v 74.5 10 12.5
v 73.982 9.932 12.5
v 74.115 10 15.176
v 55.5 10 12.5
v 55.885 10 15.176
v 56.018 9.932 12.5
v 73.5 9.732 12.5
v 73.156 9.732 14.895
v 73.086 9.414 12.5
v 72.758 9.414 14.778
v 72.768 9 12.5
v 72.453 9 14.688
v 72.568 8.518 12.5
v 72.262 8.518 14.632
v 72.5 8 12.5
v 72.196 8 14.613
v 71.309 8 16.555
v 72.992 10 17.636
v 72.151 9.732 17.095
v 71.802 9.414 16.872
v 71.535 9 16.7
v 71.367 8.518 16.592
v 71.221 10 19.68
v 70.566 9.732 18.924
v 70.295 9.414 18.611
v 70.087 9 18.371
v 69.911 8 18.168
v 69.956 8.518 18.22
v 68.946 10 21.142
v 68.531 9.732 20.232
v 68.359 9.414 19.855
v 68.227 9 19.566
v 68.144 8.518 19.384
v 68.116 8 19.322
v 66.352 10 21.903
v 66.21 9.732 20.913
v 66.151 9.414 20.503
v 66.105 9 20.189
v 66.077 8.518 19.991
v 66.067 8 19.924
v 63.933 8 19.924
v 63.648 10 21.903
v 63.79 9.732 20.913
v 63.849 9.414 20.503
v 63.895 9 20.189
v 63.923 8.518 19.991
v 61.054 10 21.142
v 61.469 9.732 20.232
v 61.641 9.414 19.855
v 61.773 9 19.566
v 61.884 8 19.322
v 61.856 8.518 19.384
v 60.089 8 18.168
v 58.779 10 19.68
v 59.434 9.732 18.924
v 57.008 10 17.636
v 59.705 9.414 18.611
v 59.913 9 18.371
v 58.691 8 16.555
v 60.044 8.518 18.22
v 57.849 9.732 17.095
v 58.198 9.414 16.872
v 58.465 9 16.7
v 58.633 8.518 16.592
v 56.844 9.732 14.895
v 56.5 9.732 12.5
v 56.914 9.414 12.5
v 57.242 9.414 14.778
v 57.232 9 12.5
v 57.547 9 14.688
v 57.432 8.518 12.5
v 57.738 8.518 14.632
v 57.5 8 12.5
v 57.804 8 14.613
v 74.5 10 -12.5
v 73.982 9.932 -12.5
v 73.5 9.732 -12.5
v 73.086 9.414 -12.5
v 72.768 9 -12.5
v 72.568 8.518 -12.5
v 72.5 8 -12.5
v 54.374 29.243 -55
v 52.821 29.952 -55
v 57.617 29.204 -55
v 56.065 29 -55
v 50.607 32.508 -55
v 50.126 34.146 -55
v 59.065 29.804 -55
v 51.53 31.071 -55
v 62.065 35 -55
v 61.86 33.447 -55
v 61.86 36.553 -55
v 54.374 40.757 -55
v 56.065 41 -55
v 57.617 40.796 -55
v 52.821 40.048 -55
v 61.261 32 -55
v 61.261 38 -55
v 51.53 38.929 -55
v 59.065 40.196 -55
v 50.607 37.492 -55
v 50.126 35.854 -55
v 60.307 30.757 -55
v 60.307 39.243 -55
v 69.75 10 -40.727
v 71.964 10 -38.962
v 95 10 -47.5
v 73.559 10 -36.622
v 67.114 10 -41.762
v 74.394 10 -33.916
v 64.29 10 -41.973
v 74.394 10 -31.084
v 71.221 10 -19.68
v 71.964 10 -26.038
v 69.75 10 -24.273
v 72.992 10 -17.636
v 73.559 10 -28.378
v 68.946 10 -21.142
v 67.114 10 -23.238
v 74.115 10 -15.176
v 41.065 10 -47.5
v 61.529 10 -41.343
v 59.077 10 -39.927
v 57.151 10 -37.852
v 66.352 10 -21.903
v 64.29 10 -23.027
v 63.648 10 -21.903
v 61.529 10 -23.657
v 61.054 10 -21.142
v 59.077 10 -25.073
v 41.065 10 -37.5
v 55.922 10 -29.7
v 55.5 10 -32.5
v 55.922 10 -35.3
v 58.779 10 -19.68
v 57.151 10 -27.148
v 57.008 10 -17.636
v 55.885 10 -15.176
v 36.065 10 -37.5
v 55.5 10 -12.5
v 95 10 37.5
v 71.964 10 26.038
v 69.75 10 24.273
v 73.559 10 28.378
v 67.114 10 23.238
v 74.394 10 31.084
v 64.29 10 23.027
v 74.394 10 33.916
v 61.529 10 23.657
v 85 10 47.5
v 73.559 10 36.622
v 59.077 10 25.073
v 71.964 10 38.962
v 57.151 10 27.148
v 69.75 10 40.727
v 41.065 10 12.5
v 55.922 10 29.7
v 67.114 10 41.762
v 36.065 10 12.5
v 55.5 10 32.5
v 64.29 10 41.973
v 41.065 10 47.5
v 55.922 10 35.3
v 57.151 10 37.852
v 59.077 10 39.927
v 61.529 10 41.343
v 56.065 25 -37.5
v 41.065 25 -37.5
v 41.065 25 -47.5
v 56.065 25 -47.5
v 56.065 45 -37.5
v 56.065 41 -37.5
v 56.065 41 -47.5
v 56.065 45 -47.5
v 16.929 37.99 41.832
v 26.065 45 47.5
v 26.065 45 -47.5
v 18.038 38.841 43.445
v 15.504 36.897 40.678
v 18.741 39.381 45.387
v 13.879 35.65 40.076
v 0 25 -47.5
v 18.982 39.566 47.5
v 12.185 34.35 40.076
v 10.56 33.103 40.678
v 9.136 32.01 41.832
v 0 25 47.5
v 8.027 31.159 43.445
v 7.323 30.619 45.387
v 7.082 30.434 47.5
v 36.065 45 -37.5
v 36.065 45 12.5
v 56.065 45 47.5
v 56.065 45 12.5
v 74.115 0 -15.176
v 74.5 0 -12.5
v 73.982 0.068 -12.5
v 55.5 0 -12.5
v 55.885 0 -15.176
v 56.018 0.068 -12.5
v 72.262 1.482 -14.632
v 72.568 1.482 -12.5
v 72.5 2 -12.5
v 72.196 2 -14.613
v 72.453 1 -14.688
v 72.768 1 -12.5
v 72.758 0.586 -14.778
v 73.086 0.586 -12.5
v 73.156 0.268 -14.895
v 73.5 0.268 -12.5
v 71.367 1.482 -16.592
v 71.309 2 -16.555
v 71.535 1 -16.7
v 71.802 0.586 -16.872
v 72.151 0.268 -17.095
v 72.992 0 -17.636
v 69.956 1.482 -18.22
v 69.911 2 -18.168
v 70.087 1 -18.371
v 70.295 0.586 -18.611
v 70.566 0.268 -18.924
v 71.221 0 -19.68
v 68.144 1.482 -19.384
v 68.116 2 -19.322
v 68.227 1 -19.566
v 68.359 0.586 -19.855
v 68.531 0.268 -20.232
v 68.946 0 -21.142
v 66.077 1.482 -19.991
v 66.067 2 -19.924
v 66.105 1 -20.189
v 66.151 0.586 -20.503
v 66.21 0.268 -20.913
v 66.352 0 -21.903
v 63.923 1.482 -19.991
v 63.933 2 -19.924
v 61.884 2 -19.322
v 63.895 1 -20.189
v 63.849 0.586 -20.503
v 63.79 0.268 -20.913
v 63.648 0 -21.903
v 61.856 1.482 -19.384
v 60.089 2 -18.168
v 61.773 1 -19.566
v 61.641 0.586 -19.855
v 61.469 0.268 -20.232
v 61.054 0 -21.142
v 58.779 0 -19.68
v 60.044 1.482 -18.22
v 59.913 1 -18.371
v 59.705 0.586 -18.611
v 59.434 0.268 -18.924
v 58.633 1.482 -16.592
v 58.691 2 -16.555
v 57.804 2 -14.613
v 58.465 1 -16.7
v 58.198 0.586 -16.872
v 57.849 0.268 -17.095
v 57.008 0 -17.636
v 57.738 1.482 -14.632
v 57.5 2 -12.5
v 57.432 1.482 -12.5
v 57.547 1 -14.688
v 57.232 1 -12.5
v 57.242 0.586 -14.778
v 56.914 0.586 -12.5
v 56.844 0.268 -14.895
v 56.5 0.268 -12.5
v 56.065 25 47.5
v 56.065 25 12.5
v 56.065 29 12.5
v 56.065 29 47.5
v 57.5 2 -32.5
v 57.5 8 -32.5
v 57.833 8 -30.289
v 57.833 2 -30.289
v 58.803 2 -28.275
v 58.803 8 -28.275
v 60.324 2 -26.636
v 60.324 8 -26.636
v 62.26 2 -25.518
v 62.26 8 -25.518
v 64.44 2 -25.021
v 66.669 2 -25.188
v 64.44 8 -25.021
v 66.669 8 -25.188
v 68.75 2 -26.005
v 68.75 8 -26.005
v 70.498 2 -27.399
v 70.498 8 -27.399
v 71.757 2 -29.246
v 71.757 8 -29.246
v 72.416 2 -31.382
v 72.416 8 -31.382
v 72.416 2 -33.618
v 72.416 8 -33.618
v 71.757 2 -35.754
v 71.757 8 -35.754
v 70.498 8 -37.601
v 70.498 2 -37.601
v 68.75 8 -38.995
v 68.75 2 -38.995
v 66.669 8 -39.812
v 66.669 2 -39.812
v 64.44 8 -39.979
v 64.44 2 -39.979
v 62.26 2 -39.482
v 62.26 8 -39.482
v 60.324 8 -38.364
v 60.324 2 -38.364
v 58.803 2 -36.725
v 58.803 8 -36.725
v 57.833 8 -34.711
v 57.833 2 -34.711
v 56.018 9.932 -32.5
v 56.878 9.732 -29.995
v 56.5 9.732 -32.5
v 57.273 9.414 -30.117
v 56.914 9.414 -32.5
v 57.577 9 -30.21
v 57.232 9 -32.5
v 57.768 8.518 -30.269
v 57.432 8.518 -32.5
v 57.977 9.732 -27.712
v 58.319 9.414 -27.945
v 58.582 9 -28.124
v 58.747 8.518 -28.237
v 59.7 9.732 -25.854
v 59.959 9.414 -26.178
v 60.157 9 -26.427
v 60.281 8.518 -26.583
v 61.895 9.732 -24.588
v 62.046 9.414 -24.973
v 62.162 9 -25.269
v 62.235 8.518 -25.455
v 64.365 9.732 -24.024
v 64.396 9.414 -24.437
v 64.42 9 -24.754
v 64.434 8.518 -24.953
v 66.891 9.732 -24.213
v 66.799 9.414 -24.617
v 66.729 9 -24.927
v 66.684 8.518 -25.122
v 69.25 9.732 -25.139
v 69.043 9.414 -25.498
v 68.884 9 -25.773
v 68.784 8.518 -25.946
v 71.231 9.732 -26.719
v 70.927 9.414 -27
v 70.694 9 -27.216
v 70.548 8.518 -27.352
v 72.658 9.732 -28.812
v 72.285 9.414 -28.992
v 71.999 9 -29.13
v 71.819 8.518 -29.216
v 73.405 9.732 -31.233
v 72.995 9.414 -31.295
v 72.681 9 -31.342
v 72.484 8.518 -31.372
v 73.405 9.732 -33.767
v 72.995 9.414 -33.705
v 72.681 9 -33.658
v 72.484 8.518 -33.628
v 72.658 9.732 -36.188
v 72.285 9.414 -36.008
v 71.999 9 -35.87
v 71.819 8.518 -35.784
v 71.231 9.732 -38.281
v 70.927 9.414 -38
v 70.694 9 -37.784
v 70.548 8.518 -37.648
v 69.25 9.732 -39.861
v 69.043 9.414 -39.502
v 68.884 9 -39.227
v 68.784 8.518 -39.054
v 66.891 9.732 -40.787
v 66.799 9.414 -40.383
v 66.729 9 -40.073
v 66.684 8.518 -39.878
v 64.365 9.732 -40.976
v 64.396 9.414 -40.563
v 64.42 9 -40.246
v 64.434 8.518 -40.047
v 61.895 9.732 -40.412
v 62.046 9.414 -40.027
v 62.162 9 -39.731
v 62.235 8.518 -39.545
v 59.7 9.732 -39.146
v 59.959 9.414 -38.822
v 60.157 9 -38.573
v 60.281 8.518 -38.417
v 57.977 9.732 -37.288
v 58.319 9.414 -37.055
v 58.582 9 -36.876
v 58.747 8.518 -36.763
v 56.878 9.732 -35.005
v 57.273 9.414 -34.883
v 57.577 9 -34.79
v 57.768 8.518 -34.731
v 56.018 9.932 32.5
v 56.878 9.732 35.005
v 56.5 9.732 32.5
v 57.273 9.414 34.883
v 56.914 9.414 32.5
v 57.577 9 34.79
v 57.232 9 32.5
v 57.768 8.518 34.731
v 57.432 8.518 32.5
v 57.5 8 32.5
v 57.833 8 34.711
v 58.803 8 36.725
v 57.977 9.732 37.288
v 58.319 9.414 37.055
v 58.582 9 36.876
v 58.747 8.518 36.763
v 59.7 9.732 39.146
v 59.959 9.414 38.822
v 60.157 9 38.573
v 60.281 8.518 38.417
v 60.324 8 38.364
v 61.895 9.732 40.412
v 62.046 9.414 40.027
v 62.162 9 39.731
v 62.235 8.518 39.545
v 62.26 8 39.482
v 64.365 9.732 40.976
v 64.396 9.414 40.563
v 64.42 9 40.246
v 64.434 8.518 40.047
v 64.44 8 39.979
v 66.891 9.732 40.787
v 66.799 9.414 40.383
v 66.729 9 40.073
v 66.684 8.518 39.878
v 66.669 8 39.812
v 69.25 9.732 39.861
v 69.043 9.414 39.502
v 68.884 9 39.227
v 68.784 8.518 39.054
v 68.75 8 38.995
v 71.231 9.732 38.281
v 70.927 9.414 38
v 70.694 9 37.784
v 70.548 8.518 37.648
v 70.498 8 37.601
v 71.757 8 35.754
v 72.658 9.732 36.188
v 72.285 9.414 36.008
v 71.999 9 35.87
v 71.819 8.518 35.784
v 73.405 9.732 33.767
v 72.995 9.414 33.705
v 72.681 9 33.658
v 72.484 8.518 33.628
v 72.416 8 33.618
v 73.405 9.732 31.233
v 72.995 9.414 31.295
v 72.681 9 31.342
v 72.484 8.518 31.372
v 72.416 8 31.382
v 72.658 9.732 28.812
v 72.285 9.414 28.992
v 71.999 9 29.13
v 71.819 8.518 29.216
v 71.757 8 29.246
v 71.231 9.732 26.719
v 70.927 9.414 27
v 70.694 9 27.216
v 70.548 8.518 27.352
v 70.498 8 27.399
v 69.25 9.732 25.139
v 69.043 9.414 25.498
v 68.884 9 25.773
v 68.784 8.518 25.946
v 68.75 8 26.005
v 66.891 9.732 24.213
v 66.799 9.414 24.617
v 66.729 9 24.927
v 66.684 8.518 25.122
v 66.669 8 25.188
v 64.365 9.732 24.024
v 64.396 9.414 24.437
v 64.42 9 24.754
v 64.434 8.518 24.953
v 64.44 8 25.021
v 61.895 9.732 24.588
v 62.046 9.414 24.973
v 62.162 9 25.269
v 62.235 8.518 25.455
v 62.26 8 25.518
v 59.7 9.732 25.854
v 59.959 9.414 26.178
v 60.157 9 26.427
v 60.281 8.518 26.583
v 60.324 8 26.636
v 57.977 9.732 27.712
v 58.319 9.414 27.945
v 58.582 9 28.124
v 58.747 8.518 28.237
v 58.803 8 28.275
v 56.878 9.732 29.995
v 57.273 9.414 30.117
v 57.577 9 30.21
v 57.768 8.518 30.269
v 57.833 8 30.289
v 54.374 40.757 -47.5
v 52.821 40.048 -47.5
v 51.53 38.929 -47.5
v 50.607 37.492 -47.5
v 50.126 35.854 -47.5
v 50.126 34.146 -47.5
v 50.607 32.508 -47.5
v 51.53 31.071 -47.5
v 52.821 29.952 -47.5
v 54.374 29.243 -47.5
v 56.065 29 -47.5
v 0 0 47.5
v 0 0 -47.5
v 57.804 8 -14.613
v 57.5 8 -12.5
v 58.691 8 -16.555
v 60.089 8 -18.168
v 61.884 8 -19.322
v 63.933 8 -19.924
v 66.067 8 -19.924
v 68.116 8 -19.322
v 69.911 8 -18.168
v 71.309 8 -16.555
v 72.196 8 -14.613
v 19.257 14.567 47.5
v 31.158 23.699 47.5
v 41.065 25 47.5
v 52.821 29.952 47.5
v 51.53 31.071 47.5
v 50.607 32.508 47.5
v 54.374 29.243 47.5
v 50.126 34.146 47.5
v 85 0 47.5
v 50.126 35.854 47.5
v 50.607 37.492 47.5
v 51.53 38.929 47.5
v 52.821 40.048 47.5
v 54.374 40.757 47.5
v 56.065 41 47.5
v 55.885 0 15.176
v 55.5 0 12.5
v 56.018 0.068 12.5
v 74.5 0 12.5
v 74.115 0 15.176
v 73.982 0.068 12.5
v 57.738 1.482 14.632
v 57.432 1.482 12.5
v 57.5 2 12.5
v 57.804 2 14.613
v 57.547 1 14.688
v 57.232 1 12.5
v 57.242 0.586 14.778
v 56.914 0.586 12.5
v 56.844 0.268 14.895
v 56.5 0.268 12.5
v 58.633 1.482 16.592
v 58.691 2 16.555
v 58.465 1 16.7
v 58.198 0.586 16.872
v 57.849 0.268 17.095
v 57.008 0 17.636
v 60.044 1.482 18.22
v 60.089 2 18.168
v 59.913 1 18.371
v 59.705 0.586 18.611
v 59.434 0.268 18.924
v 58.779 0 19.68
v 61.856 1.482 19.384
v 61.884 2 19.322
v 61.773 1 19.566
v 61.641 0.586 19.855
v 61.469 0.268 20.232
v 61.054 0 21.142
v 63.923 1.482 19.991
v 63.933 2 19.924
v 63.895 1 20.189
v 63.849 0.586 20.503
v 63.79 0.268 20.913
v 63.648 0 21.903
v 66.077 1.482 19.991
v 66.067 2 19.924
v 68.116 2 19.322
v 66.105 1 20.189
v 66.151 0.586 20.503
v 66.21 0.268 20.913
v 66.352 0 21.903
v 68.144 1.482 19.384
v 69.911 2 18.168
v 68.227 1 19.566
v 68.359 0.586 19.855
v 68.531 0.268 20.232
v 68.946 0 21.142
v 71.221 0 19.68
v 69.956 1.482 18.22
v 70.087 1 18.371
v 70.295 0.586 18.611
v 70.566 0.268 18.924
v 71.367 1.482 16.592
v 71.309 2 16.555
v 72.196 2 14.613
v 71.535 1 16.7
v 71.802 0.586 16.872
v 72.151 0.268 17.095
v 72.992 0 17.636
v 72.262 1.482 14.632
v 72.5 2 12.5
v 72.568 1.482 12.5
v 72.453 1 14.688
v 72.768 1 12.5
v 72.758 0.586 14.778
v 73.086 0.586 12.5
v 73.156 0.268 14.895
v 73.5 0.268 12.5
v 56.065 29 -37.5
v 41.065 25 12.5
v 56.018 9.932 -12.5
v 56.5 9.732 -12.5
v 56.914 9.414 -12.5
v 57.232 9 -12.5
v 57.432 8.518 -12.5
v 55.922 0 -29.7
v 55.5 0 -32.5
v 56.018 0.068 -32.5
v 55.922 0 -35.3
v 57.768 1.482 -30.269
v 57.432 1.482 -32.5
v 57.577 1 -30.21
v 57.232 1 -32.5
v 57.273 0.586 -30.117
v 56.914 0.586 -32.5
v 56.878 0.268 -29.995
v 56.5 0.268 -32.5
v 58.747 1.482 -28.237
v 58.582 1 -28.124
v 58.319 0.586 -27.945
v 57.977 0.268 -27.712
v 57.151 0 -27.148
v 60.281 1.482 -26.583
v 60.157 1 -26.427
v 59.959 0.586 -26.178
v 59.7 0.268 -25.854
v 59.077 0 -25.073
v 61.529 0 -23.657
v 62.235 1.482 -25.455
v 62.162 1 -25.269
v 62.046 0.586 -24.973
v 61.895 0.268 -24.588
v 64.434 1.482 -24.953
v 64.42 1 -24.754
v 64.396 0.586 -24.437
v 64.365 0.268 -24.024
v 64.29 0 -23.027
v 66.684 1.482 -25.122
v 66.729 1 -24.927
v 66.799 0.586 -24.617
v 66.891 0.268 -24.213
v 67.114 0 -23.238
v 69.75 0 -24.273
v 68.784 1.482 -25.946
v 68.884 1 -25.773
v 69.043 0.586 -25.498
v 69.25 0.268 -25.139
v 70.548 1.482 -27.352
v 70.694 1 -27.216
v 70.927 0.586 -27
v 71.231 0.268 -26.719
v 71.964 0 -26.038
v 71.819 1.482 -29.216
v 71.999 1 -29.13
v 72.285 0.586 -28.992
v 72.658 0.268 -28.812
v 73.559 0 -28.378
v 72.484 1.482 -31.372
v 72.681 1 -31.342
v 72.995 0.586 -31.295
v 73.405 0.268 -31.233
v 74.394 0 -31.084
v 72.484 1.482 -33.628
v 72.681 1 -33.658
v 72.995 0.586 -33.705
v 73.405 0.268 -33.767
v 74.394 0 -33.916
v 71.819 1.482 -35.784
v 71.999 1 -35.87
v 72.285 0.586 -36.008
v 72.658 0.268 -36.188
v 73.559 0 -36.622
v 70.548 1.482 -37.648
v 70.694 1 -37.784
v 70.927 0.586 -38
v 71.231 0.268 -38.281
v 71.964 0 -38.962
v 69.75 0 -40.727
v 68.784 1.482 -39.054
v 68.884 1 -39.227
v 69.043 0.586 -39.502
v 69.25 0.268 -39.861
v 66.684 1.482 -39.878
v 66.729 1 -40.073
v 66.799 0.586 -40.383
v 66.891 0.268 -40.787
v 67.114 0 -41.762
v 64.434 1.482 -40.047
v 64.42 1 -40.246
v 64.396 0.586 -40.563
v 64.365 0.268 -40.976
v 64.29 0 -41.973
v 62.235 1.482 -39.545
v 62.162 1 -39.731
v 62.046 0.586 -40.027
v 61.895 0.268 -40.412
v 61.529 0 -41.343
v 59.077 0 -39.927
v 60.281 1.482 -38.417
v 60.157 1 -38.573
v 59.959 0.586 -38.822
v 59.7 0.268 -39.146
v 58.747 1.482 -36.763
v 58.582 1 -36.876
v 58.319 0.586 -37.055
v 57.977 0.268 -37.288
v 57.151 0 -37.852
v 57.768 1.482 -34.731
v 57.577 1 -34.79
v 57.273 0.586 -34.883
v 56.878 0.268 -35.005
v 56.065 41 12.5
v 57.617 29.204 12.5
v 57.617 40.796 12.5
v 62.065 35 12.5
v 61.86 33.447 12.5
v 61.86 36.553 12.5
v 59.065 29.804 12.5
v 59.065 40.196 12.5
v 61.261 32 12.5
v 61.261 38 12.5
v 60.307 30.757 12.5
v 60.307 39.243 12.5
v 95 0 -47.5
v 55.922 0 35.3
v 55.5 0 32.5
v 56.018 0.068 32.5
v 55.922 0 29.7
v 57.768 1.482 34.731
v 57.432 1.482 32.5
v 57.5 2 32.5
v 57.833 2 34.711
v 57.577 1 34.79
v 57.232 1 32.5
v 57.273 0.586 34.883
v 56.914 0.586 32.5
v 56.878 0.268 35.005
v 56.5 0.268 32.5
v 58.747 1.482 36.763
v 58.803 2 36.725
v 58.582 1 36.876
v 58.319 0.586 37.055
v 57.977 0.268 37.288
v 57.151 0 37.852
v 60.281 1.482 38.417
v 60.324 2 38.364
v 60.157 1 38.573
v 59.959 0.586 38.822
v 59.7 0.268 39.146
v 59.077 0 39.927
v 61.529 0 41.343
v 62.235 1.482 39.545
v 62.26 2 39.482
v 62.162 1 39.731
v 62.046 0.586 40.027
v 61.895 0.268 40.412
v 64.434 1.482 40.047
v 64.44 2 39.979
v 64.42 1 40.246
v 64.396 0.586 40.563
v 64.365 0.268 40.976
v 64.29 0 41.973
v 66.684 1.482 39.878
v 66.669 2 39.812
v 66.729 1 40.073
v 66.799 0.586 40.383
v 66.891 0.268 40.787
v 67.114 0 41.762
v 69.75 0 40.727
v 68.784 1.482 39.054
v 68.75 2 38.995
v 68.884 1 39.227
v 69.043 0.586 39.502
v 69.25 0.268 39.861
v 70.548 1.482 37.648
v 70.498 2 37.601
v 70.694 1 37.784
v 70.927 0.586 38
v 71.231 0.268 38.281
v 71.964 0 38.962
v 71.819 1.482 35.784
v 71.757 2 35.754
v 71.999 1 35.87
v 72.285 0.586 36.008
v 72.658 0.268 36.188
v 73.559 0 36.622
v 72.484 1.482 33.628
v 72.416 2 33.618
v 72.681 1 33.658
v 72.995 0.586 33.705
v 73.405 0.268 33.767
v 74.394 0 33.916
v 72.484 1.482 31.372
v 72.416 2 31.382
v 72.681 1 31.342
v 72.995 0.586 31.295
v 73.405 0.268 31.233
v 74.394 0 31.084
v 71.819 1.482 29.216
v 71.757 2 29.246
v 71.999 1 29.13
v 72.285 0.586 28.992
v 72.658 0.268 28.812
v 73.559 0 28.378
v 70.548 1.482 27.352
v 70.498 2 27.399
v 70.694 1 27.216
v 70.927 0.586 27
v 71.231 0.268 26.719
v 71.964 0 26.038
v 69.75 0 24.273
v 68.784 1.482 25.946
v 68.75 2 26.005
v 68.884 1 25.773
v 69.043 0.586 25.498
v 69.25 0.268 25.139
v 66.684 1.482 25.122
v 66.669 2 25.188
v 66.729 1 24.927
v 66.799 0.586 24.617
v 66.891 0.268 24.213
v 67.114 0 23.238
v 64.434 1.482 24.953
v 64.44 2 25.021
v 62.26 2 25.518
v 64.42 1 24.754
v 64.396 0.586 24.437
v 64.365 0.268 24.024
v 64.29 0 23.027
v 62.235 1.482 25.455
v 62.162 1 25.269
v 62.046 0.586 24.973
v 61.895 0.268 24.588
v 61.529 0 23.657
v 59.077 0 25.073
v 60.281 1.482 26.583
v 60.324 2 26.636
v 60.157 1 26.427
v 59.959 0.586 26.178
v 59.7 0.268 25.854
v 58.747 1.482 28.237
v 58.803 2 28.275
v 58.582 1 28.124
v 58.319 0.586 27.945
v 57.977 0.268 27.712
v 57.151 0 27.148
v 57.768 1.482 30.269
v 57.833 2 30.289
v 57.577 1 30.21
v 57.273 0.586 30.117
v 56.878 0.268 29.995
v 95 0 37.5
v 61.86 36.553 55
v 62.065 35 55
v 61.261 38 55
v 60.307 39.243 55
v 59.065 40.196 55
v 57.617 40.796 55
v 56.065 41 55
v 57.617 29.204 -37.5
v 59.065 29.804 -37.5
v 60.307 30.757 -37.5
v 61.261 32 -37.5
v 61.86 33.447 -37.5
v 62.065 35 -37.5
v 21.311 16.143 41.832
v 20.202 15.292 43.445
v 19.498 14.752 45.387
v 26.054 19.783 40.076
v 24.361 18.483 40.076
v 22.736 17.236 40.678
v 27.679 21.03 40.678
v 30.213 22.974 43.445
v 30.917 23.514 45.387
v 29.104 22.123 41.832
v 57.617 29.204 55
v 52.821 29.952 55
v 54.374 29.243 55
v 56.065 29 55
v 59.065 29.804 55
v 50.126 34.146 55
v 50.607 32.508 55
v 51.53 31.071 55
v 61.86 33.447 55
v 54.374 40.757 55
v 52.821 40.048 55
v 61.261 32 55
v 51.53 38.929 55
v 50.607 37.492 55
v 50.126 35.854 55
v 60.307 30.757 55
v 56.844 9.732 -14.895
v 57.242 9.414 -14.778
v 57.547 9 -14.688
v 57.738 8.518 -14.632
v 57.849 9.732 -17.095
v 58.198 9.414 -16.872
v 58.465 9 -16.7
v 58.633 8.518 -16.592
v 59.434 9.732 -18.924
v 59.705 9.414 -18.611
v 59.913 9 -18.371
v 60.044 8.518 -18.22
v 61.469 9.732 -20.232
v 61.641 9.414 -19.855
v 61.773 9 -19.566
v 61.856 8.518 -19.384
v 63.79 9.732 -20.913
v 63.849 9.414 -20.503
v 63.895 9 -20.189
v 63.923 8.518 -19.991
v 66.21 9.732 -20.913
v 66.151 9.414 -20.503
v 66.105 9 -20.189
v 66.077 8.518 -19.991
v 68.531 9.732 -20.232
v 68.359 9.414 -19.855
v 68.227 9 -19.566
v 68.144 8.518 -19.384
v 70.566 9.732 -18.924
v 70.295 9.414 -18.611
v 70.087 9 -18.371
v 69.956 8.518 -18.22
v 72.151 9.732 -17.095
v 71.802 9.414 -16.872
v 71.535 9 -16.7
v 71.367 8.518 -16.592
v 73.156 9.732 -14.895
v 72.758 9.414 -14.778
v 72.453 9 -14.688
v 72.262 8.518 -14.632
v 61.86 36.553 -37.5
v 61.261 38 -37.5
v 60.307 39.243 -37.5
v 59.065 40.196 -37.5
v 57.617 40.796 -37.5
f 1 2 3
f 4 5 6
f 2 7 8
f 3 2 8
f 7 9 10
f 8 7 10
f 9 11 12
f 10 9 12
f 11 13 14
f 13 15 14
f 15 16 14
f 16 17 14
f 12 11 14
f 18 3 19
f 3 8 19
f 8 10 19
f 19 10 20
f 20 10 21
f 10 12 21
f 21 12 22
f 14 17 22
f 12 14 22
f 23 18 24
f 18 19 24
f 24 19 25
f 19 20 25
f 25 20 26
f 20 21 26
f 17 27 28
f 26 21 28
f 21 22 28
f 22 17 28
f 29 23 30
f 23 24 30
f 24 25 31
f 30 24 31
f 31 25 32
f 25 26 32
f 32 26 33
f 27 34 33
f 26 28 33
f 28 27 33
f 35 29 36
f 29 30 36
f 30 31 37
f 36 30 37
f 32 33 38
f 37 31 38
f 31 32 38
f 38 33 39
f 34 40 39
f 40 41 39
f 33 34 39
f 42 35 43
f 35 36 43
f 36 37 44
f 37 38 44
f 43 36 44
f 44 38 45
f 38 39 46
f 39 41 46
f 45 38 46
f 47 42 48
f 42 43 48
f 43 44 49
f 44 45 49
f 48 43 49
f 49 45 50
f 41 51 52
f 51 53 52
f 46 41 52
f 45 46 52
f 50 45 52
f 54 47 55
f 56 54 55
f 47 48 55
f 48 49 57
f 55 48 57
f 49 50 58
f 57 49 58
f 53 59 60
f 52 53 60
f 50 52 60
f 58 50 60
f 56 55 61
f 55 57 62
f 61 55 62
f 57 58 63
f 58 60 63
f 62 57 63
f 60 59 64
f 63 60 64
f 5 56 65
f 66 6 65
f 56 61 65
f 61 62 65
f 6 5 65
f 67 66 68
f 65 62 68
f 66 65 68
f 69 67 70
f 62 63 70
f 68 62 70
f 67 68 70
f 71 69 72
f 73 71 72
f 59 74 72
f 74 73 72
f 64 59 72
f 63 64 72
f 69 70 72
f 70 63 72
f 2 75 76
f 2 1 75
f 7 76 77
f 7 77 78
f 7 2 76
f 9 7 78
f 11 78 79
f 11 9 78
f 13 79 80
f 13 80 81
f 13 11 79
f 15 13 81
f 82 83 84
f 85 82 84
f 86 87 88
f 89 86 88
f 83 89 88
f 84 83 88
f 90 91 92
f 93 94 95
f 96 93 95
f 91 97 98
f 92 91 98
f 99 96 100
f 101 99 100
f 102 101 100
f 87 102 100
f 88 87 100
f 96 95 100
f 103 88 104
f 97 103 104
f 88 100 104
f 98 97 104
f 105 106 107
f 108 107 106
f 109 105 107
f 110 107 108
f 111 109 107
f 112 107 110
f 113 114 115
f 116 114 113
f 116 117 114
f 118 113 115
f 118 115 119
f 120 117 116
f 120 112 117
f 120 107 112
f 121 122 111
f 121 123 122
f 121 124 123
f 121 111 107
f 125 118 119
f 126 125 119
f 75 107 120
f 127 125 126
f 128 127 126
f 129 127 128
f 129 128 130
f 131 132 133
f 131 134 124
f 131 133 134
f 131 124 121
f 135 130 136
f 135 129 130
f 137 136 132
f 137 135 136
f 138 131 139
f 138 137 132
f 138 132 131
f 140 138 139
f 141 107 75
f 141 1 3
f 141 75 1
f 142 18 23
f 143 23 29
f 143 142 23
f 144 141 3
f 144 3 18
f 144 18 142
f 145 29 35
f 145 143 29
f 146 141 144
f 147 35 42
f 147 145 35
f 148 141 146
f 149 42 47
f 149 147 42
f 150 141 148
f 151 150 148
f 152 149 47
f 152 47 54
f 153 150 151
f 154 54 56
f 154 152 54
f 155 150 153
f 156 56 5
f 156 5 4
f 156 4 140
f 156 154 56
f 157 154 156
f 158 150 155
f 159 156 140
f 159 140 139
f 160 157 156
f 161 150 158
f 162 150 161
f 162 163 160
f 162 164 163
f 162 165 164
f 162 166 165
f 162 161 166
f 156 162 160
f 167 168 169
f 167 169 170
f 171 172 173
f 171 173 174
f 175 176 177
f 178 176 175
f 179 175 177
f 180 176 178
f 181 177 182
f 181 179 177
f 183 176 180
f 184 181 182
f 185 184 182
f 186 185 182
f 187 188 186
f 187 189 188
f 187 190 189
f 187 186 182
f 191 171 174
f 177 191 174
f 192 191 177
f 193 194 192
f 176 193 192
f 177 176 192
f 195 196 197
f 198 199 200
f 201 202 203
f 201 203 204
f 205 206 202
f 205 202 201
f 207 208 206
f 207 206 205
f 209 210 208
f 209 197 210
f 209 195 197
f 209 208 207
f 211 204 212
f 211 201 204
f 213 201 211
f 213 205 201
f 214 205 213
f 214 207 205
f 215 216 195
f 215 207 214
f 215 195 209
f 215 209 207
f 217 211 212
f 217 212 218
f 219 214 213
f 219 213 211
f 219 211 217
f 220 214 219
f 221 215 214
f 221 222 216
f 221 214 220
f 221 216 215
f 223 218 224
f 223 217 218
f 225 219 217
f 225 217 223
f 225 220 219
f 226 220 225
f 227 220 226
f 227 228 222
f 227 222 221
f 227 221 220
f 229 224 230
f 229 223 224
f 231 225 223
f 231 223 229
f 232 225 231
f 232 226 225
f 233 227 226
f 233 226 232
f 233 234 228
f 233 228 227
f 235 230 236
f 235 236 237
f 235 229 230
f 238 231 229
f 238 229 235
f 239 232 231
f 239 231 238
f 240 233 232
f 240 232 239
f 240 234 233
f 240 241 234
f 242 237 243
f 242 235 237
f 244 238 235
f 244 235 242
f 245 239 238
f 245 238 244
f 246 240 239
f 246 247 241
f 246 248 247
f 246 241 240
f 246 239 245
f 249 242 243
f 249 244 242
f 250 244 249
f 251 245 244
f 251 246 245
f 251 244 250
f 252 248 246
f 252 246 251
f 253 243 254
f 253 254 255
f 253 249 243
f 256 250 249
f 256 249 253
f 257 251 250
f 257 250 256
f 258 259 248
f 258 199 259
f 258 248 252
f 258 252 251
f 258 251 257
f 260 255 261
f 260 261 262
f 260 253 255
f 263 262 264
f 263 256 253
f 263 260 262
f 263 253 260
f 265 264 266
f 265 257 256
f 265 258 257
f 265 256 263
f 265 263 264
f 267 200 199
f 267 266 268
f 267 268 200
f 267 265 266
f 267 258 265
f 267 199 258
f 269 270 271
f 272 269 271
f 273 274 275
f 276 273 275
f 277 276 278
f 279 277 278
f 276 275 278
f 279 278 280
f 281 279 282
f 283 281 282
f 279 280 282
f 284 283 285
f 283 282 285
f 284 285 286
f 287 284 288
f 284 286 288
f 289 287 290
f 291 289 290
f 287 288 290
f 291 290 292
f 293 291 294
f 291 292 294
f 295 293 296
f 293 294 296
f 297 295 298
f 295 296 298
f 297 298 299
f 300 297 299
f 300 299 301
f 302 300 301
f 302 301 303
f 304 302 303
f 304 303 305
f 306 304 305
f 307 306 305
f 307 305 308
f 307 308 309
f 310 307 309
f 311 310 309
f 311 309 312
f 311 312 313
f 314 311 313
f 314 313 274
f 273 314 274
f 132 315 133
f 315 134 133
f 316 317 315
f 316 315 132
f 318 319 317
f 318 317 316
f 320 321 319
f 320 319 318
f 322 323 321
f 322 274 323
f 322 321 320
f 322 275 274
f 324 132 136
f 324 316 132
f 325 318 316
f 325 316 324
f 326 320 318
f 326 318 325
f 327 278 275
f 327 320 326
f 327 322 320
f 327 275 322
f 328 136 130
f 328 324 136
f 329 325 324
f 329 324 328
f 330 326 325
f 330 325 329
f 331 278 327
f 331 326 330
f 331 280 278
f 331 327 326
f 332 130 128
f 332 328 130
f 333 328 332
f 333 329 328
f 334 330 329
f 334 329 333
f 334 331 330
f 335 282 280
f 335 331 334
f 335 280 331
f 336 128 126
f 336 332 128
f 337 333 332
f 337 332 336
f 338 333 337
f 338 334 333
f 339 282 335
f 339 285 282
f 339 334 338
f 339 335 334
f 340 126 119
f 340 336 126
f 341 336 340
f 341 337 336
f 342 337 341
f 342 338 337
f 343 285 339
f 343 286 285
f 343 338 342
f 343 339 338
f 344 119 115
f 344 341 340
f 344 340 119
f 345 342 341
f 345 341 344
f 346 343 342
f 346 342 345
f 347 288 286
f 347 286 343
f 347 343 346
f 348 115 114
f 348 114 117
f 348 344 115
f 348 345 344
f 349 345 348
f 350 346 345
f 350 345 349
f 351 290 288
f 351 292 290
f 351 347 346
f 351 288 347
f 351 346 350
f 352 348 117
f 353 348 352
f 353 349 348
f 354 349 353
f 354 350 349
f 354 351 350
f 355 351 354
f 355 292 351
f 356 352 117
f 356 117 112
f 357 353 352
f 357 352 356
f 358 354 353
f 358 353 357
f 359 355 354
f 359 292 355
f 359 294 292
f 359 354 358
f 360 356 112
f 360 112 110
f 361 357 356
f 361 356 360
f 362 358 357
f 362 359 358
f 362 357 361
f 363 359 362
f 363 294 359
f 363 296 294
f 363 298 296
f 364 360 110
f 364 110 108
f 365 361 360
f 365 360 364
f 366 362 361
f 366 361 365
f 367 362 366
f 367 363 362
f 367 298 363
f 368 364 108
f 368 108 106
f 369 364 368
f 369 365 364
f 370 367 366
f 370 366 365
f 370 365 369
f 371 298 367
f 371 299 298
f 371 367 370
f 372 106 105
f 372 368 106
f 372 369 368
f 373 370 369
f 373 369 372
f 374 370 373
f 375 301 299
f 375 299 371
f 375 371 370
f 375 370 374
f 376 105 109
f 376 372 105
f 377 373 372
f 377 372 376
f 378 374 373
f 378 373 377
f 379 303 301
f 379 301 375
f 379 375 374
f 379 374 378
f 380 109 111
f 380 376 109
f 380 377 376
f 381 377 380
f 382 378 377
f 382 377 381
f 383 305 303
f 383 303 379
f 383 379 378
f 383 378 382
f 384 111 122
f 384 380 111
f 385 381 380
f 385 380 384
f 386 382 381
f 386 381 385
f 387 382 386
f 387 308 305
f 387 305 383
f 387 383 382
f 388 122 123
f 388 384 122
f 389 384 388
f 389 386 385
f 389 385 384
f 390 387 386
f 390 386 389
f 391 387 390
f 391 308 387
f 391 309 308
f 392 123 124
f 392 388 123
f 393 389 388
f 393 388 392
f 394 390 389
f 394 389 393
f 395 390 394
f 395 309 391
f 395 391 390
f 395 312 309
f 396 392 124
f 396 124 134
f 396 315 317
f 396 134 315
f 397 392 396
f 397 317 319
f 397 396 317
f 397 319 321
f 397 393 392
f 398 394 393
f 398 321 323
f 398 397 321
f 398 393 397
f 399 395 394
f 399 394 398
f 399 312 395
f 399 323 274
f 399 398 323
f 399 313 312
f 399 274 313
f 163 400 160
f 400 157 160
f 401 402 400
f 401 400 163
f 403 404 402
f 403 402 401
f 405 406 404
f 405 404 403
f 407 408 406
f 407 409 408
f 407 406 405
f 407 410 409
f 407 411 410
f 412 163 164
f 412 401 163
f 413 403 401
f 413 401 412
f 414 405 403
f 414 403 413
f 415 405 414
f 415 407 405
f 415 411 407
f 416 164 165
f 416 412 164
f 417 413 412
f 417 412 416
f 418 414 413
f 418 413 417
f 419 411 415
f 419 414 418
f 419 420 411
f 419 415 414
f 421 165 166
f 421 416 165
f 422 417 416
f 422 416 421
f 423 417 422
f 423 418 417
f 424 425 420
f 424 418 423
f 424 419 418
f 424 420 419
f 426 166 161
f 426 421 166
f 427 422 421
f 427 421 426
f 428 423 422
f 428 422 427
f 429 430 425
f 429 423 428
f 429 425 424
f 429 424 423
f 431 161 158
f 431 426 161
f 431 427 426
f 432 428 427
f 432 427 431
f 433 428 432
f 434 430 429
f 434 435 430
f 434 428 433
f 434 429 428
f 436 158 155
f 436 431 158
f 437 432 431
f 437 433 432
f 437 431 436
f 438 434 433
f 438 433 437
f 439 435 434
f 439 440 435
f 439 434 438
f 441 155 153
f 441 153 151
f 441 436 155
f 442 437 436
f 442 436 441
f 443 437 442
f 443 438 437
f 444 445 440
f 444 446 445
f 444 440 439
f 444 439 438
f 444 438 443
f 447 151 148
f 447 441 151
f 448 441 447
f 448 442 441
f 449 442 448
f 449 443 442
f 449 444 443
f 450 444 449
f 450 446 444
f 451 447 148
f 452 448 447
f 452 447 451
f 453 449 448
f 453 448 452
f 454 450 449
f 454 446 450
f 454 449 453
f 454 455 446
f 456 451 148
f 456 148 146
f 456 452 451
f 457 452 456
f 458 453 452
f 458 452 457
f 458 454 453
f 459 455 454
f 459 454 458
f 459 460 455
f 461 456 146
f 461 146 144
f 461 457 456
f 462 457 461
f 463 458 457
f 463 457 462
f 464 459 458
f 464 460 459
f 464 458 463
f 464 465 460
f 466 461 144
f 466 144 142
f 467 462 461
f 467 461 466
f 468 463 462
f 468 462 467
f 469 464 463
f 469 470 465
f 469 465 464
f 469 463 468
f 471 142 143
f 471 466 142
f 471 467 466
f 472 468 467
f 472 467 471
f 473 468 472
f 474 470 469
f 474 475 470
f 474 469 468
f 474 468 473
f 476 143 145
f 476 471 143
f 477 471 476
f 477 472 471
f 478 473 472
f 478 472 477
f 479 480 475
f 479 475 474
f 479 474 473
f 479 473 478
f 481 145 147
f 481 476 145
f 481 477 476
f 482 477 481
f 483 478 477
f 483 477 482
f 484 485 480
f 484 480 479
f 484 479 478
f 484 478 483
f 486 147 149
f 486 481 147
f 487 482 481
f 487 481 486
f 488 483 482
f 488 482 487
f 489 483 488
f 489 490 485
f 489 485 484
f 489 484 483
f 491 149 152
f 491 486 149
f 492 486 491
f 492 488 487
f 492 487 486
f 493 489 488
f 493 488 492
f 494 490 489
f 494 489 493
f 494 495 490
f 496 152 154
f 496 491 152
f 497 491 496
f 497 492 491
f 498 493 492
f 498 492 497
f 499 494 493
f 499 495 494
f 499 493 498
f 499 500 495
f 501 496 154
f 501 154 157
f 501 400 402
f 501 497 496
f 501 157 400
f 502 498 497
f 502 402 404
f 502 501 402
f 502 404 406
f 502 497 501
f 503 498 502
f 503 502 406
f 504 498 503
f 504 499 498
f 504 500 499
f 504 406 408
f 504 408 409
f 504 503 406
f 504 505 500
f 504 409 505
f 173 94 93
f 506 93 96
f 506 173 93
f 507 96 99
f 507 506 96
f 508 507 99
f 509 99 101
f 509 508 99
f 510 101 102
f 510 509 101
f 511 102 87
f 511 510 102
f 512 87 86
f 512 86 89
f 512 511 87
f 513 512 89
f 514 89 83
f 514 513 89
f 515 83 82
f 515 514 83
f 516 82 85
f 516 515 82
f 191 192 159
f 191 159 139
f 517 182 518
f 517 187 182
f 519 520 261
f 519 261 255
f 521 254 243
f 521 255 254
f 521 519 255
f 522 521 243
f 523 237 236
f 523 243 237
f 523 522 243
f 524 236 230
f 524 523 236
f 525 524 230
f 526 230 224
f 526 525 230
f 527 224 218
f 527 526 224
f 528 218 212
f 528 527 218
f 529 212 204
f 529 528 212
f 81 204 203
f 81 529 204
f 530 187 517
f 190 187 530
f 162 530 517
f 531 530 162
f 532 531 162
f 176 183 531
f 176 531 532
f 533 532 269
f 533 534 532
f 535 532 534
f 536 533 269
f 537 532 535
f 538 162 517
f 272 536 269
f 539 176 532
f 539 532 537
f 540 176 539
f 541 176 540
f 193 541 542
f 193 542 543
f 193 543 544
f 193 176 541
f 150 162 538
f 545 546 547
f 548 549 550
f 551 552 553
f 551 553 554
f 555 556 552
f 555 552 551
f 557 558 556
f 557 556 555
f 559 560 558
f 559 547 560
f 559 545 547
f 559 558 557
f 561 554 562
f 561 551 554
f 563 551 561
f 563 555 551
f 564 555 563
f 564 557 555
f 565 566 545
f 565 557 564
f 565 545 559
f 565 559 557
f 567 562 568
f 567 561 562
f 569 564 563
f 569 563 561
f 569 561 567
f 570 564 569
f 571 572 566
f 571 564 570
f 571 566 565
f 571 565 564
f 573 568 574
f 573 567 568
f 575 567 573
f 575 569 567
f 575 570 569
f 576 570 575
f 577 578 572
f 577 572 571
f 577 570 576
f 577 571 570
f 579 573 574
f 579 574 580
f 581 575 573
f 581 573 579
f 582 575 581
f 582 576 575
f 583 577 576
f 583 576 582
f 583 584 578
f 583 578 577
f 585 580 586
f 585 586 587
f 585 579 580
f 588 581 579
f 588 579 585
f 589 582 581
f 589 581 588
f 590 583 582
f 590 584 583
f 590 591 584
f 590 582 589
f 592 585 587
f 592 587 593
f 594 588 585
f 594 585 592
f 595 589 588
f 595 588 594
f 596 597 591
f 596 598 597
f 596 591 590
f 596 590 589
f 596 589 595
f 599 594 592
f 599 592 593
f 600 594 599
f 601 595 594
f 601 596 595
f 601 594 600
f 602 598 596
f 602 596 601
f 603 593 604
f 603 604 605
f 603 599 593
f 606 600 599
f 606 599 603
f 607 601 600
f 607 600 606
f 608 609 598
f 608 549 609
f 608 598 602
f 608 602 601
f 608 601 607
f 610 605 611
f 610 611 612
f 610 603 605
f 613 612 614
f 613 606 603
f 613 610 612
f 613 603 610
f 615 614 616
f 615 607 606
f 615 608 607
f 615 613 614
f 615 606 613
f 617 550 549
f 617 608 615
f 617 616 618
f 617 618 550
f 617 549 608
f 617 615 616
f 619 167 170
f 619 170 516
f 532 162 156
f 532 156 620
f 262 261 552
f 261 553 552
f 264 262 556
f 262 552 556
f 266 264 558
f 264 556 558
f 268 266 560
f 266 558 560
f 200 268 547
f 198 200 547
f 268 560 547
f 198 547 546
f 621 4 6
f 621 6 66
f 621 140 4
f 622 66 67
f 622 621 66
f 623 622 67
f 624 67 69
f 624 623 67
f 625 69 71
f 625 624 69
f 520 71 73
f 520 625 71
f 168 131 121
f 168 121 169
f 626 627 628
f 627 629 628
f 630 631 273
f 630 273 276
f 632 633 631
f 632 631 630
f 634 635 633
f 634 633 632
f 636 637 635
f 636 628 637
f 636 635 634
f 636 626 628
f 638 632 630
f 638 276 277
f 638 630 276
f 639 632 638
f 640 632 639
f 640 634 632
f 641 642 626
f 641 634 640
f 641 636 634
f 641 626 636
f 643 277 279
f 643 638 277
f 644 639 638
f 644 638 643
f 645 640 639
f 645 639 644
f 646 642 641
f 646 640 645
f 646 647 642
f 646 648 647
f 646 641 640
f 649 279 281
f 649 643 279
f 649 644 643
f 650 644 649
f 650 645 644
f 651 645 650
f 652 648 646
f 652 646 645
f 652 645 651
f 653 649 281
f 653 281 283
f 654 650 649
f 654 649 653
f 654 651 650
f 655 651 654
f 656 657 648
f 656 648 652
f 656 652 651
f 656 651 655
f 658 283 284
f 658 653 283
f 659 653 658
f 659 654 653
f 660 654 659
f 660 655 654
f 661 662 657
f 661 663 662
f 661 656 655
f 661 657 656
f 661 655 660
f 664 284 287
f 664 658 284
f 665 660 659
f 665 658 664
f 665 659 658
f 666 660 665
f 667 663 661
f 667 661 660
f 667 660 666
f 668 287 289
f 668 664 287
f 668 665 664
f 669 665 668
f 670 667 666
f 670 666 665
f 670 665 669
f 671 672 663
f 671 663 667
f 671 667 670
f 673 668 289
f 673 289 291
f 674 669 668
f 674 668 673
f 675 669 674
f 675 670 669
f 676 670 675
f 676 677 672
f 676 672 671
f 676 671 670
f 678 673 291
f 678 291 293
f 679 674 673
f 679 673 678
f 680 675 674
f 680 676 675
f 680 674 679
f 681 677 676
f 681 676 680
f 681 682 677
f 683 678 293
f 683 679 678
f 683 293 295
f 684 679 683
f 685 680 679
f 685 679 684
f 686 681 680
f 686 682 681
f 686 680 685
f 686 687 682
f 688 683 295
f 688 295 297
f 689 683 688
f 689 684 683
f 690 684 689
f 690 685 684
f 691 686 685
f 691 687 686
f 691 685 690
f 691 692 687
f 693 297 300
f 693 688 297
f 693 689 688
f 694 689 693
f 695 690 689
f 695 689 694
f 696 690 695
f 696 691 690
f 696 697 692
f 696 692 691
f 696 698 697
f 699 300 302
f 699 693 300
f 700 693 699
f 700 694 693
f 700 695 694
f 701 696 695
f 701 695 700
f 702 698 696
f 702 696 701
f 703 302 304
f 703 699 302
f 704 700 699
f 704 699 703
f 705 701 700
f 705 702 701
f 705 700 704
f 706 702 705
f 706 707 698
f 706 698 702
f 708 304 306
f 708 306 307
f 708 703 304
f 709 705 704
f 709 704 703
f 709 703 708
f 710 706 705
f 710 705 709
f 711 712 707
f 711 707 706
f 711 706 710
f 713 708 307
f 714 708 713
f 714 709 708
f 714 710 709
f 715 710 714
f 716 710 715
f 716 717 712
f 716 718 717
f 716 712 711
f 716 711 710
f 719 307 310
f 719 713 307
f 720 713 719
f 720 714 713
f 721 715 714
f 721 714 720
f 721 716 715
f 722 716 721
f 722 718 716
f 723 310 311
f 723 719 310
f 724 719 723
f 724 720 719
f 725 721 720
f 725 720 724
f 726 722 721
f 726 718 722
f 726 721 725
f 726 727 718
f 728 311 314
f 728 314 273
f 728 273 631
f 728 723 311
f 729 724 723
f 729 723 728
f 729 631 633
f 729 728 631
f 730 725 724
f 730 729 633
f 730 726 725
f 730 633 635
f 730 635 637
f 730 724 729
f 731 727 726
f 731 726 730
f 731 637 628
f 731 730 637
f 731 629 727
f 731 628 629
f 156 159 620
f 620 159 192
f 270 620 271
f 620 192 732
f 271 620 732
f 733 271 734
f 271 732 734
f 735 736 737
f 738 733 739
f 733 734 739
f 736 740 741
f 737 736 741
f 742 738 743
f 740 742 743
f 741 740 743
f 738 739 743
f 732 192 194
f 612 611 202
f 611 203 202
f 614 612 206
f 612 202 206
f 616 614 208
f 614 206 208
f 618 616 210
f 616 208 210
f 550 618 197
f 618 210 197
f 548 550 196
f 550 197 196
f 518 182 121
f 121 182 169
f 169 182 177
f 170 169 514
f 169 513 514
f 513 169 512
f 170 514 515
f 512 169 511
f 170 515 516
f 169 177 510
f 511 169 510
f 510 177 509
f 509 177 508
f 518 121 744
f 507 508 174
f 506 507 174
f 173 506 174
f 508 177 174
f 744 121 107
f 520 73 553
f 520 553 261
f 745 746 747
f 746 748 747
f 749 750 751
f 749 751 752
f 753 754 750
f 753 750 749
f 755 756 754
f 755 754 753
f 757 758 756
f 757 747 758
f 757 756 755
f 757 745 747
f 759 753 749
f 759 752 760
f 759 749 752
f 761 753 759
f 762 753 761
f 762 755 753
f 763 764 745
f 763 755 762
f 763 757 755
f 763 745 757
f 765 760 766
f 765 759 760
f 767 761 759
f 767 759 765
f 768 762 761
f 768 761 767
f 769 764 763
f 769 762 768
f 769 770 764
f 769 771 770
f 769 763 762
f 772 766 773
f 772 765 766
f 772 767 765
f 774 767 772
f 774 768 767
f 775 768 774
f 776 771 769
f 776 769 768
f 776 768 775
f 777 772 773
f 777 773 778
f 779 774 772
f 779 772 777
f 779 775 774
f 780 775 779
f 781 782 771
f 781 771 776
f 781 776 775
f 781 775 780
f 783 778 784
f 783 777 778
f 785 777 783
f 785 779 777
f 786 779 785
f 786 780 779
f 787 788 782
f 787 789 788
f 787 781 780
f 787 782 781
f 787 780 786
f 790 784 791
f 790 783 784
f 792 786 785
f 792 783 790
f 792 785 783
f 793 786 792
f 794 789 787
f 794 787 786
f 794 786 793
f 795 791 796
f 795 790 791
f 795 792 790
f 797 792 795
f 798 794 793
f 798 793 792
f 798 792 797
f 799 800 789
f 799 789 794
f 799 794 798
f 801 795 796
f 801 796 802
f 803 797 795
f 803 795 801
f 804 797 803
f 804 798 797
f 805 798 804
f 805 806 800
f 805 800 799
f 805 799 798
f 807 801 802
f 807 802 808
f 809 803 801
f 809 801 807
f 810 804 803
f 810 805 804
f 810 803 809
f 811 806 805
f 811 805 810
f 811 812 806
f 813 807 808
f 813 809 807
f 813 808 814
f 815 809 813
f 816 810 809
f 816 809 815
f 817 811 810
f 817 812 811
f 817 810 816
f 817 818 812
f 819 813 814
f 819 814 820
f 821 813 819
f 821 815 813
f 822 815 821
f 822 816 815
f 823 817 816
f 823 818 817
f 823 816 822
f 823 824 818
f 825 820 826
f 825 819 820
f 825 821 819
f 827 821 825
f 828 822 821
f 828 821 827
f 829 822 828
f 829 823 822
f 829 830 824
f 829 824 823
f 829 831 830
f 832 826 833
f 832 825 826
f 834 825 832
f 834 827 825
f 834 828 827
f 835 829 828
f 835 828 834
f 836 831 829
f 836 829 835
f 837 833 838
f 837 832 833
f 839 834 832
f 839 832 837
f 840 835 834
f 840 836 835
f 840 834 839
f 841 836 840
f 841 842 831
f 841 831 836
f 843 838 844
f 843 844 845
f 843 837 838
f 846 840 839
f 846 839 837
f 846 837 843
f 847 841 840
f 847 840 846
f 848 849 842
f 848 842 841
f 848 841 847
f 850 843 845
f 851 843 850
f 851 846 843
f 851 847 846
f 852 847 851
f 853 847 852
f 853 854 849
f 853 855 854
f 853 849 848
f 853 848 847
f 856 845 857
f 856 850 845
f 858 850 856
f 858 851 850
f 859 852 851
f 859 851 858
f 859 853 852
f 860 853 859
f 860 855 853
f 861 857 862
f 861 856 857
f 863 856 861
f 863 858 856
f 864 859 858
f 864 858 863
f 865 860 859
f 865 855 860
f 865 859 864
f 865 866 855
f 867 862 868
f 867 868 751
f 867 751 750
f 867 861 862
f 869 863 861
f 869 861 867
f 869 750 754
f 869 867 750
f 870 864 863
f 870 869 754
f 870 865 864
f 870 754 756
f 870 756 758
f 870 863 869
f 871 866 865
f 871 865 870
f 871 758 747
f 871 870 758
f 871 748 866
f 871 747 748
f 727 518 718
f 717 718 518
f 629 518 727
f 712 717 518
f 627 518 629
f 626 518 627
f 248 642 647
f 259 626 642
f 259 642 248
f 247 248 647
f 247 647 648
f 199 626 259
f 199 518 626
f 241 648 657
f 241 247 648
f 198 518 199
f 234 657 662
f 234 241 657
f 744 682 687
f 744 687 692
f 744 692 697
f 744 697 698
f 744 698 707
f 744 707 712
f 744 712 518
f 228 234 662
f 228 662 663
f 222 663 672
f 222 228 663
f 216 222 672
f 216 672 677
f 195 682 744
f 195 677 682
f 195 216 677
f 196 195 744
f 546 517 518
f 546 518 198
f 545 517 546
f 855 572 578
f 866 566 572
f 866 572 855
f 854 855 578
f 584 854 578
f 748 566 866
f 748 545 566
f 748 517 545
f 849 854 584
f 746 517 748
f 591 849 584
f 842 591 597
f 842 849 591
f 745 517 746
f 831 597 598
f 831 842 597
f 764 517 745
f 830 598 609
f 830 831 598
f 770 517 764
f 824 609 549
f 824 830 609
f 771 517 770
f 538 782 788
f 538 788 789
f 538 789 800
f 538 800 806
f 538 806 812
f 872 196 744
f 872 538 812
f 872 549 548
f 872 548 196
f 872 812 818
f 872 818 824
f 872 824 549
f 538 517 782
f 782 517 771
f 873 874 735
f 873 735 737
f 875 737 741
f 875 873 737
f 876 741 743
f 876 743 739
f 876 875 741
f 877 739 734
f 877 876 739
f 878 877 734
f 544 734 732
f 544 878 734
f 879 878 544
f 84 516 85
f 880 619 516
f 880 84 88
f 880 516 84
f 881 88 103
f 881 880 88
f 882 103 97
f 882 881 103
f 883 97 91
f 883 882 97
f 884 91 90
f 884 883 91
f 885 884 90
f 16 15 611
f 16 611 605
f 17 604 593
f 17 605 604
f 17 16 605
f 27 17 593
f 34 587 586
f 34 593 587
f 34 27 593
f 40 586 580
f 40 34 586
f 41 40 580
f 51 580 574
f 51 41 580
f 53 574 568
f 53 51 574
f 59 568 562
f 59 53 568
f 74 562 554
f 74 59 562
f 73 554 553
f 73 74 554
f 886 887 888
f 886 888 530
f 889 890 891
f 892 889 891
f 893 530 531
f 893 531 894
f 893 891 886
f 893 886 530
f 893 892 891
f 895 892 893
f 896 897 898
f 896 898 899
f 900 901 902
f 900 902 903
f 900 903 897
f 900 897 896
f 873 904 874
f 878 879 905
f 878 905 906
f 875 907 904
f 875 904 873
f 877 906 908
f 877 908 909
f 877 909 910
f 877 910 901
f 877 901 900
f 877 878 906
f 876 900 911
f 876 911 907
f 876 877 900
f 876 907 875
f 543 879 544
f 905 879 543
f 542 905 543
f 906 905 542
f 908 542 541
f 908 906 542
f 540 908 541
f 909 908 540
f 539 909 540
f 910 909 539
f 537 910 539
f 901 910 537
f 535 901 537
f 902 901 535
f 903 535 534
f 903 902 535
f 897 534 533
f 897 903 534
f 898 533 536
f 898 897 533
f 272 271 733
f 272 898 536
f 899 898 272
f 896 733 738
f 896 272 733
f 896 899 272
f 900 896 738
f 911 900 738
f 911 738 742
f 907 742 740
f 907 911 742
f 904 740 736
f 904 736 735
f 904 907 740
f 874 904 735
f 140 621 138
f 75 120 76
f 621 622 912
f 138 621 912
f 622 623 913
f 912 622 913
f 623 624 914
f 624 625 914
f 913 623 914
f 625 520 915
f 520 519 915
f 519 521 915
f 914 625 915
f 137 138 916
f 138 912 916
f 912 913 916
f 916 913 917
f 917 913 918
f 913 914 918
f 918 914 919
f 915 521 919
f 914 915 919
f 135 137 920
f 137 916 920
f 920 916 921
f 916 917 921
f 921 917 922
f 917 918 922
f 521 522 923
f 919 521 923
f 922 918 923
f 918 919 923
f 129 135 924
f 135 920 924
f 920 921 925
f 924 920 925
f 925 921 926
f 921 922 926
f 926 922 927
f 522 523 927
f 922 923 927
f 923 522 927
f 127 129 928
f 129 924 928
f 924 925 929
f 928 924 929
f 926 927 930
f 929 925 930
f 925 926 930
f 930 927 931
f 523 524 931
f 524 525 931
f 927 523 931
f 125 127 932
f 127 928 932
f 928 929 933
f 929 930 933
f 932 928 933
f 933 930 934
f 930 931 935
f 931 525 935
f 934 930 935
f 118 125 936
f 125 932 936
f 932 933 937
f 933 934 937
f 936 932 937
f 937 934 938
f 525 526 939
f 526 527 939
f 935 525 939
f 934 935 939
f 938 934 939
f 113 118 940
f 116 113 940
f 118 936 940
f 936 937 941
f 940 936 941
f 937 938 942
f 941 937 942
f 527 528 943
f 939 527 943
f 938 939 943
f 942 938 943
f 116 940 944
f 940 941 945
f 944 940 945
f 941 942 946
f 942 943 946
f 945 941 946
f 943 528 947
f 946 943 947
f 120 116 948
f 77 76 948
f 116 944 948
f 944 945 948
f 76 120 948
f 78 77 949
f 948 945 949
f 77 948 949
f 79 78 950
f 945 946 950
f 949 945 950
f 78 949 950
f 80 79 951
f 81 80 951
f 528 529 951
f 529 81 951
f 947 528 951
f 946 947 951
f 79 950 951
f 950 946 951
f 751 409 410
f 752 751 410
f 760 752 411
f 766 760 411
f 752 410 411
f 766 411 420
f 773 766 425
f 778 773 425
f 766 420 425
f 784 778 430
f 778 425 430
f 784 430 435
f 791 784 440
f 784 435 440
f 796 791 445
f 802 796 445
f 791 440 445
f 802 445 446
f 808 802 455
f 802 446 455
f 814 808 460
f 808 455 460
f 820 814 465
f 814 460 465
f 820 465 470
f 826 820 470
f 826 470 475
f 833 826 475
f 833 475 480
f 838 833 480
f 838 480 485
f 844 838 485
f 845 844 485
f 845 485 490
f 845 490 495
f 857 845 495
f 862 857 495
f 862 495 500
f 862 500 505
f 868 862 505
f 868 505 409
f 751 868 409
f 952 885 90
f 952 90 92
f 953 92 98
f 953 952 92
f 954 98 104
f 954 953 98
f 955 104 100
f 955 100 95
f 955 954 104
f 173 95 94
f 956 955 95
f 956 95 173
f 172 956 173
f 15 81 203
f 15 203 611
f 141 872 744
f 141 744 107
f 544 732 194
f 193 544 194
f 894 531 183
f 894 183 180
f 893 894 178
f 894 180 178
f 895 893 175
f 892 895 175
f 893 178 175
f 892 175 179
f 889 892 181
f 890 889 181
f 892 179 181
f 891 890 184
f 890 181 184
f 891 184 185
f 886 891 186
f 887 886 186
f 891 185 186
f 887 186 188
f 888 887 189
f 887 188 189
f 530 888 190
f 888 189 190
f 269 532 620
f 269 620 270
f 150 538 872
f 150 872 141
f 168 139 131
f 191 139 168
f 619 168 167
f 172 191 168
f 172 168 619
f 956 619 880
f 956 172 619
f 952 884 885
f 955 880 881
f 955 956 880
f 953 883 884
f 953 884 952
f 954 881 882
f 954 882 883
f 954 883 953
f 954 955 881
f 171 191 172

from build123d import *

# Parameters (mm, degrees)
BOSS_EXTRU_1_DEPTH      = 47.5
BOSS_EXTRU_2_DEPTH      = 55
ESQUISSE3_R             = 7.5
ENL_V_MAT_EXTRU_1_DEPTH = 20
ENL_V_MAT_EXTRU_2_REACH = 120.638
ESQUISSE4_W             = 42.689900708
ESQUISSE4_H             = 50
ESQUISSE5_R             = 7.5
ENL_V_MAT_EXTRU_3_DEPTH = 116.217186218
CONG_1_R                = 2
CHANFREIN1_SIZE         = 10


with BuildPart() as part:
    # Esquisse2 → Boss.-Extru.1 (new, symmetric)
    with BuildSketch(Plane.XY):
        with BuildLine():
            Line((0, 25), (0, 0))
            Line((0, 0), (95, 0))
            Line((95, 0), (95, 10))
            Line((95, 10), (41.064507457, 10))
            Line((41.064507457, 10), (41.064507457, 25))
            Line((41.064507457, 25), (56.064507457, 25))
            Line((56.064507457, 25), (56.064507457, 29))
            ThreePointArc((56.064507457, 29), (50.064507457, 35), (56.064507457, 41))
            Line((56.064507457, 41), (56.064507457, 45))
            Line((56.064507457, 45), (26.064507457, 45))
            Line((26.064507457, 45), (0, 25))
        make_face()
    extrude(amount=BOSS_EXTRU_1_DEPTH, both=True)

    # Esquisse2<3> → Boss.-Extru.2 (add, symmetric)
    with BuildSketch(Plane.XY):
        with BuildLine():
            ThreePointArc((62.064507457, 35), (60.307148144, 39.242640687), (56.064507457, 41))
            Line((56.064507457, 41), (56.064507457, 29))
            ThreePointArc((56.064507457, 29), (60.307148144, 30.757359313), (62.064507457, 35))
        make_face()
        with BuildLine():
            Line((56.064507457, 29), (56.064507457, 41))
            ThreePointArc((56.064507457, 41), (50.064507457, 35), (56.064507457, 29))
        make_face()
    extrude(amount=BOSS_EXTRU_2_DEPTH, both=True)

    # Esquisse3 → Enlèv. mat.-Extru.1 (cut)
    with BuildSketch(Plane(origin=(-12.074072829, 15.735238064, 0), x_dir=(0.7933533402912363, 0.6087614290087191, 0), z_dir=(-0.6087614290087192, 0.7933533402912364, 0))):
        with Locations((31.645832042, -47.5)):
            Circle(ESQUISSE3_R)
    extrude(amount=-ENL_V_MAT_EXTRU_1_DEPTH, mode=Mode.SUBTRACT)

    # Enlèv. mat.-Extru.2: up to this face of the body (flat: up to its plane)
    enl_v_mat_extru_2_end = Plane(part.part.faces().sort_by_distance((68.032253728, 10, 0))[0])
    # Esquisse4 → Enlèv. mat.-Extru.2 (cut, up to the picked face)
    with BuildSketch(Plane(origin=(0, 45, 0), x_dir=(1, 0, 0), z_dir=(0, 1, 0)), mode=Mode.PRIVATE) as enl_v_mat_extru_2_sk1:
        with Locations((57.409457811, 12.5)):
            Rectangle(ESQUISSE4_W, ESQUISSE4_H)
    enl_v_mat_extru_2_tool1 = split(extrude(enl_v_mat_extru_2_sk1.sketch, amount=-ENL_V_MAT_EXTRU_2_REACH, mode=Mode.PRIVATE), bisect_by=enl_v_mat_extru_2_end, keep=Keep.BOTH, mode=Mode.PRIVATE)
    add(enl_v_mat_extru_2_tool1.solids().sort_by(Axis((57.409458, 45, -12.5), (0, -1, 0)))[0], mode=Mode.SUBTRACT)

    # Esquisse5 → Enlèv. mat.-Extru.3 (cut, through all)
    with BuildSketch(Plane(origin=(0, 10, 0), x_dir=(1, 0, 0), z_dir=(0, 1, 0))):
        with Locations(Location((65, 32.5, 0), (0, 0, 180))):
            Circle(ESQUISSE5_R)
        with Locations(Location((65, -32.5, 0), (0, 0, 180))):
            Circle(ESQUISSE5_R)
        with BuildLine():
            Line((57.5, -12.5), (57.5, 12.5))
            ThreePointArc((57.5, 12.5), (65, 20), (72.5, 12.5))
            Line((72.5, 12.5), (72.5, -12.5))
            ThreePointArc((72.5, -12.5), (65, -20), (57.5, -12.5))
        make_face()
    extrude(amount=-ENL_V_MAT_EXTRU_3_DEPTH, mode=Mode.SUBTRACT)

    # Congé1
    cong_1_edges = [part.edges().sort_by_distance(p)[0] for p in [
        (72.5, 0, -32.5),
        (72.5, 10, -32.5),
        (65, 0, 20),
        (57.5, 0, 0),
        (65, 0, -20),
        (72.5, 0, 0),
        (65, 10, 20),
        (72.5, 10, 0),
        (65, 10, -20),
        (57.5, 10, 0),
        (72.5, 0, 32.5),
        (72.5, 10, 32.5),
    ]]
    fillet(cong_1_edges, radius=CONG_1_R)

    # Chanfrein1
    chanfrein1_edges = [part.edges().sort_by_distance(p)[0] for p in [
        (95, 5, 47.5),
    ]]
    chamfer(chanfrein1_edges, length=CHANFREIN1_SIZE)


solid = part.part
